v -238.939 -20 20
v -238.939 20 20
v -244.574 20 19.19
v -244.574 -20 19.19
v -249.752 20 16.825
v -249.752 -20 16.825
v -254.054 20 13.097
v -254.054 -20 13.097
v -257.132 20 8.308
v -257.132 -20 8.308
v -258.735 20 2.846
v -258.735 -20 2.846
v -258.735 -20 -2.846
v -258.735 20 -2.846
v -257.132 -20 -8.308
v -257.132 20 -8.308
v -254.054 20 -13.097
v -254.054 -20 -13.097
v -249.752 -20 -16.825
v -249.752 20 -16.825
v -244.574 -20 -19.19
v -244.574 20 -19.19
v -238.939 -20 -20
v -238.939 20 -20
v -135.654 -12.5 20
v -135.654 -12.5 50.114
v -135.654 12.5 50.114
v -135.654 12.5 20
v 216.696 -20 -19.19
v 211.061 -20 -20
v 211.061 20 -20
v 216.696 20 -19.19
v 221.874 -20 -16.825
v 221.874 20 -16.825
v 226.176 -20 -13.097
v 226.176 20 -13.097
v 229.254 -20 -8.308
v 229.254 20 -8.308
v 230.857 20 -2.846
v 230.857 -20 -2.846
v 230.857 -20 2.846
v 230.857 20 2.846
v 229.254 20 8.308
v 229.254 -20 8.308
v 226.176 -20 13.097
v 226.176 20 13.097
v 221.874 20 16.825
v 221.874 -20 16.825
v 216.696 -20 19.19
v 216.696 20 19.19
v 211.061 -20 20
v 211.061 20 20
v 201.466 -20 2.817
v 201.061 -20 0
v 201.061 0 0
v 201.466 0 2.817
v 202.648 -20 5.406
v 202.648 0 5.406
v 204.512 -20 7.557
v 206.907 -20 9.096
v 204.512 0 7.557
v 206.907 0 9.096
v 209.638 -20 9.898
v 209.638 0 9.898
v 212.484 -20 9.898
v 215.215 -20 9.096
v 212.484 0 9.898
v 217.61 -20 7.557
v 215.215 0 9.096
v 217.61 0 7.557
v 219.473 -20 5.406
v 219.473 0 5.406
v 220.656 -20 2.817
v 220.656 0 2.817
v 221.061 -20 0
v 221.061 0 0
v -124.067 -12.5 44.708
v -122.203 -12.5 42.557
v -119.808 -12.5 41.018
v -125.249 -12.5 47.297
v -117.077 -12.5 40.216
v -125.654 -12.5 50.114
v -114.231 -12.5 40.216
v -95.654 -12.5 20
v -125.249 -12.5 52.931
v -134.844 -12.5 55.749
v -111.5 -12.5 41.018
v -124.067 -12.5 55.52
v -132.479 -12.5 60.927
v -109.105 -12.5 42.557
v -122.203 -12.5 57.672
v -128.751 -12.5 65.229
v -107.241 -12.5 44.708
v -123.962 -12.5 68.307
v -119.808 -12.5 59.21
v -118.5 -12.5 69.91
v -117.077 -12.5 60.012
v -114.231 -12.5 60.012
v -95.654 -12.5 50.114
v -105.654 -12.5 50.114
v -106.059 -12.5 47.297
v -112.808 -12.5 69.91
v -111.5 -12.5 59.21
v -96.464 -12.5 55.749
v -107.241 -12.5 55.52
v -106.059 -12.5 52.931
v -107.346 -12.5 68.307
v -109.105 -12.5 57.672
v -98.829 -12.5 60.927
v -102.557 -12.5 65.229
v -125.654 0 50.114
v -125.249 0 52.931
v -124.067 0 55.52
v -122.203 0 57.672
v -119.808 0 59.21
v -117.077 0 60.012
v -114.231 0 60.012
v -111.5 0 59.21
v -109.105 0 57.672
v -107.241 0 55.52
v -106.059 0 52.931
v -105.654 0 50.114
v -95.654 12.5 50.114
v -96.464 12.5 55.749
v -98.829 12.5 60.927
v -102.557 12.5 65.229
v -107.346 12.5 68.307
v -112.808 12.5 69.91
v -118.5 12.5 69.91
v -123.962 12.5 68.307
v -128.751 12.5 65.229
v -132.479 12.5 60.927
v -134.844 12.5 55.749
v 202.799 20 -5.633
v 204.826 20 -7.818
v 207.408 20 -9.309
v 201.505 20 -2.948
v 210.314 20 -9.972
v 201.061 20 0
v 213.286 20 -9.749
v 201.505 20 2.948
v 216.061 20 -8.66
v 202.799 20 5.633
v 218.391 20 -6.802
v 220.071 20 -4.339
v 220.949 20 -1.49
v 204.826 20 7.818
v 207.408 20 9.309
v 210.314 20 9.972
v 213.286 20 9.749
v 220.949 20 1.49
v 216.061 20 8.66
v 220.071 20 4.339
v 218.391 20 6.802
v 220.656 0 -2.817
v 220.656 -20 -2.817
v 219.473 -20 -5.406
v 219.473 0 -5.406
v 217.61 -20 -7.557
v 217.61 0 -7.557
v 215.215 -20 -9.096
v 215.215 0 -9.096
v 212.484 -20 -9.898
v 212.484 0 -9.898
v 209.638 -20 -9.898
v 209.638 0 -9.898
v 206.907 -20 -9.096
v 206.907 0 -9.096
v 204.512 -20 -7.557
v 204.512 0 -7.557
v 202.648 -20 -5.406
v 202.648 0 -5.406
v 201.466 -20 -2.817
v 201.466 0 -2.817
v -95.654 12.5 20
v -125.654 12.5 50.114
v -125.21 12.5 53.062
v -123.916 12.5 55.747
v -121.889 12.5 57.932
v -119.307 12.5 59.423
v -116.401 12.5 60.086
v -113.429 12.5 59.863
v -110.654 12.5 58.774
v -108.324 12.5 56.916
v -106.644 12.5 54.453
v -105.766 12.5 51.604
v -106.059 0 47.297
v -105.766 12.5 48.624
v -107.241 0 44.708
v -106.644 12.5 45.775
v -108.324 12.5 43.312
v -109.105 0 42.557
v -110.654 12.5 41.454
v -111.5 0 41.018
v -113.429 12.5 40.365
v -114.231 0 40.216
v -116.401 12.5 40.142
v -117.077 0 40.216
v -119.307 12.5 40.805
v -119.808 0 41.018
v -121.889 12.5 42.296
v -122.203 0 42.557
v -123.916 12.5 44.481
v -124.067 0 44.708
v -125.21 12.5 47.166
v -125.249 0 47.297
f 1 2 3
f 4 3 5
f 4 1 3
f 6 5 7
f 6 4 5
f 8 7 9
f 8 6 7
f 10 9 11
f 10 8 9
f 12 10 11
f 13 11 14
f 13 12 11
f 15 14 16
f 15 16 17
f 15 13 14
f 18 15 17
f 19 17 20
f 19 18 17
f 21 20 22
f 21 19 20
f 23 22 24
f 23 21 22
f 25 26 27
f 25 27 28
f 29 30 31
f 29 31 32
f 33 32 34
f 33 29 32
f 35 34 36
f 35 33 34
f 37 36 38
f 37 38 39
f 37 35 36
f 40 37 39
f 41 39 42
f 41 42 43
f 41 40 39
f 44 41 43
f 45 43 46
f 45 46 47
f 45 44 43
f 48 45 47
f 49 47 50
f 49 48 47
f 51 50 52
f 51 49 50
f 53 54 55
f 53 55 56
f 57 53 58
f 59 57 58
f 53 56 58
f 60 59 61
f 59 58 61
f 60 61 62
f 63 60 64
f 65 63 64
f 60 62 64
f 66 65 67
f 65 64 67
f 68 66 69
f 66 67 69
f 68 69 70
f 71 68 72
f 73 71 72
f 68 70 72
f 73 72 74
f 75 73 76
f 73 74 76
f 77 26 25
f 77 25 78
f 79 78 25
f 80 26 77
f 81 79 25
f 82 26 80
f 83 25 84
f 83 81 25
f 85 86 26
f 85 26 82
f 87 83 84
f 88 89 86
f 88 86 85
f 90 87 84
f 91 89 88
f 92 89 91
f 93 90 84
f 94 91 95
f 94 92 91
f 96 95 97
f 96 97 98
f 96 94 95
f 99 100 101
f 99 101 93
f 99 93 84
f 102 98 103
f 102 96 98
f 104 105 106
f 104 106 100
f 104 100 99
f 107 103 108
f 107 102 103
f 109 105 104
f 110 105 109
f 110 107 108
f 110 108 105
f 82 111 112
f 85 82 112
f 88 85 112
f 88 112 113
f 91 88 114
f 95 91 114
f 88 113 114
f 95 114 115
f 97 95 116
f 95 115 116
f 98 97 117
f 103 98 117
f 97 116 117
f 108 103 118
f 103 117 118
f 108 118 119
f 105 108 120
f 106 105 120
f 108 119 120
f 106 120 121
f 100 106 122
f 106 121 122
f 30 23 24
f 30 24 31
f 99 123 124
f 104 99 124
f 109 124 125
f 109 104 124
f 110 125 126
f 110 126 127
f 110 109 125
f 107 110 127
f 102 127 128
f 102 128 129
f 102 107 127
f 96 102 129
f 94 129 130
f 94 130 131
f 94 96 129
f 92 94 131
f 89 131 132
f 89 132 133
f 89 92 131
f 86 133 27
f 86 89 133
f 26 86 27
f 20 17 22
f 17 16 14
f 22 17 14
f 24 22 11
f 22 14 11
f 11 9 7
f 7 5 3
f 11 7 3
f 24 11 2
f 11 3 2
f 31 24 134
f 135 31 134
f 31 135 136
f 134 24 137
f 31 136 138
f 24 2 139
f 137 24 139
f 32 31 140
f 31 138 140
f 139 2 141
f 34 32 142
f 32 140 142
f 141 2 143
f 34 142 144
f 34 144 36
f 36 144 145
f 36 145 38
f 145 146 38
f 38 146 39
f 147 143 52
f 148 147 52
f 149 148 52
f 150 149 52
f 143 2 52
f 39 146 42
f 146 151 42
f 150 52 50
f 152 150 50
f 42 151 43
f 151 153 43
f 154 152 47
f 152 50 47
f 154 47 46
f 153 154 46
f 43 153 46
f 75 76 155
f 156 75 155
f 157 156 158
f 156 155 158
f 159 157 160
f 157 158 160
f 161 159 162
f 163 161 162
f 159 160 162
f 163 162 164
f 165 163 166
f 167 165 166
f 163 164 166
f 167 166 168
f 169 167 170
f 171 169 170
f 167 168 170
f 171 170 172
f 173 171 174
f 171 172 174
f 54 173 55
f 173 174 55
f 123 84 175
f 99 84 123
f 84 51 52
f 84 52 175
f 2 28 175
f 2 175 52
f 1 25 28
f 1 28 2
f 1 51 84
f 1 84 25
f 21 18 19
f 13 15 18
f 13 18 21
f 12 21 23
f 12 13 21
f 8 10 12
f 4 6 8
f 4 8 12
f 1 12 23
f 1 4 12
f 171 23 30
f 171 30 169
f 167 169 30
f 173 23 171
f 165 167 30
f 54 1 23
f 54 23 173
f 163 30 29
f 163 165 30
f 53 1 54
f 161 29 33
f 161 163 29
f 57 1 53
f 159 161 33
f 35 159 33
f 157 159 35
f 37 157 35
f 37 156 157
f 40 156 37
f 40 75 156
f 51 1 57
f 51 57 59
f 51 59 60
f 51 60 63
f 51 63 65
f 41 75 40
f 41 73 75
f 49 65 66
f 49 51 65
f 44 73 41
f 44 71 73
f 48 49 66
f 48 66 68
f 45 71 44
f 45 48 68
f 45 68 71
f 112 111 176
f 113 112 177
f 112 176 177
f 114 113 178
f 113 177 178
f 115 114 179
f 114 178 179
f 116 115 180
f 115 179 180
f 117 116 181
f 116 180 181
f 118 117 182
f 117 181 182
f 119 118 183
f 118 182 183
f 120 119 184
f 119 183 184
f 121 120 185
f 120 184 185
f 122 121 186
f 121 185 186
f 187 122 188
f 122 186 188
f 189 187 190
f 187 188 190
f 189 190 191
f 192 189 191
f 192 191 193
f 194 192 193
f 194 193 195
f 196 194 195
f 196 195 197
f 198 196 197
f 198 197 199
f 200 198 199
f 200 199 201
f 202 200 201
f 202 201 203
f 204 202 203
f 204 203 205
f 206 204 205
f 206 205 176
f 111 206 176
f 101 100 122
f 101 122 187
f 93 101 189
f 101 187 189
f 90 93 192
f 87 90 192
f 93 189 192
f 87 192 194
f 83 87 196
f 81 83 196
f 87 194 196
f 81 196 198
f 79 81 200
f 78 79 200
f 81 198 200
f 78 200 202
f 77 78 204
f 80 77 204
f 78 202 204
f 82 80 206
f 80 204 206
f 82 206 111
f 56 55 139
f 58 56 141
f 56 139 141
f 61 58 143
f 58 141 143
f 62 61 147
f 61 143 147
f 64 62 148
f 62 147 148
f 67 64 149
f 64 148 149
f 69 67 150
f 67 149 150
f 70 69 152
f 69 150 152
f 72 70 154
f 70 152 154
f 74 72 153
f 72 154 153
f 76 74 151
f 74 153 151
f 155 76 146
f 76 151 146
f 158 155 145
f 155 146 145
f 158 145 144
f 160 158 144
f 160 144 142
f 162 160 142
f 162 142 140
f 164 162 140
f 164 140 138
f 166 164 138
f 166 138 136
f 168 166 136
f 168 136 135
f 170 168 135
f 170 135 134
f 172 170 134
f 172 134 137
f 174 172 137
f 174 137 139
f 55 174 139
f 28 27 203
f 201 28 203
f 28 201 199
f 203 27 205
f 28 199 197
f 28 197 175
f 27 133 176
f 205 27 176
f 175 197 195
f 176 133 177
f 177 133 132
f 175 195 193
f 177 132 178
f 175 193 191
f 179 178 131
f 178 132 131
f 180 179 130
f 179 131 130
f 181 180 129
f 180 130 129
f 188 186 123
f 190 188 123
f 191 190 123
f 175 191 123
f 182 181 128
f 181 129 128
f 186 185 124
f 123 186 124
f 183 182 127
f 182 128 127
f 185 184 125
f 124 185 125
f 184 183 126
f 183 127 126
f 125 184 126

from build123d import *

# Parameters (mm, degrees)
F0_W     = 20
F0_H     = 20
F1_DEPTH = 20
F2_DEPTH = 12.5
F3_D     = 20
F3_DEPTH = 20.001
F4_D     = 20


with BuildPart() as f1:
    # F0 (on Front) → F1 (new body, symmetric)
    with BuildSketch(Plane.XZ):
        with BuildLine():
            ThreePointArc((-115.6540289521, -20), (-101.5118933284, -14.1421356237), (-95.6540289521, 0))
            Line((-95.6540289521, 0), (-115.6540289521, 0))
            Line((-115.6540289521, 0), (-135.6540289521, 0))
            ThreePointArc((-135.6540289521, 0), (-129.7961645759, -14.1421356237), (-115.6540289521, -20))
        make_face()
        with BuildLine():
            Line((-95.6540289521, 20), (-95.6540289521, 0))
            ThreePointArc((-95.6540289521, 0), (-101.5118933284, -14.1421356237), (-115.6540289521, -20))
            Line((-115.6540289521, -20), (211.0609319716, -20))
            ThreePointArc((211.0609319716, -20), (231.0609319716, 0), (211.0609319716, 20))
            Line((211.0609319716, 20), (-95.6540289521, 20))
        make_face()
        with Locations((-105.6540289521, 10)):
            Rectangle(F0_W, F0_H)
        with Locations((-125.6540289521, 10)):
            Rectangle(F0_W, F0_H)
        with BuildLine():
            Line((-238.9390680284, -20), (-115.6540289521, -20))
            ThreePointArc((-115.6540289521, -20), (-129.7961645759, -14.1421356237), (-135.6540289521, 0))
            Line((-135.6540289521, 0), (-135.6540289521, 20))
            Line((-135.6540289521, 20), (-238.9390680284, 20))
            ThreePointArc((-238.9390680284, 20), (-258.9390680284, 0), (-238.9390680284, -20))
        make_face()
    extrude(amount=F1_DEPTH, both=True)

    # F0 (on Front) → F2 (join, symmetric)
    with BuildSketch(Plane.XZ):
        with BuildLine():
            ThreePointArc((-115.6540289521, -20), (-101.5118933284, -14.1421356237), (-95.6540289521, 0))
            Line((-95.6540289521, 0), (-115.6540289521, 0))
            Line((-115.6540289521, 0), (-135.6540289521, 0))
            ThreePointArc((-135.6540289521, 0), (-129.7961645759, -14.1421356237), (-115.6540289521, -20))
        make_face()
        with BuildLine():
            Line((-95.6540289521, 20), (-95.6540289521, 0))
            ThreePointArc((-95.6540289521, 0), (-101.5118933284, -14.1421356237), (-115.6540289521, -20))
            Line((-115.6540289521, -20), (211.0609319716, -20))
            ThreePointArc((211.0609319716, -20), (231.0609319716, 0), (211.0609319716, 20))
            Line((211.0609319716, 20), (-95.6540289521, 20))
        make_face()
        with Locations((-105.6540289521, 10)):
            Rectangle(F0_W, F0_H)
        with Locations((-125.6540289521, 10)):
            Rectangle(F0_W, F0_H)
        with BuildLine():
            Line((-238.9390680284, -20), (-115.6540289521, -20))
            ThreePointArc((-115.6540289521, -20), (-129.7961645759, -14.1421356237), (-135.6540289521, 0))
            Line((-135.6540289521, 0), (-135.6540289521, 20))
            Line((-135.6540289521, 20), (-238.9390680284, 20))
            ThreePointArc((-238.9390680284, 20), (-258.9390680284, 0), (-238.9390680284, -20))
        make_face()
        with BuildLine():
            Line((-115.6540289521, 20), (-95.6540289521, 20))
            Line((-95.6540289521, 20), (-95.6540289521, 50.1140356064))
            ThreePointArc((-95.6540289521, 50.1140356064), (-115.6540289521, 70.1140356064), (-135.6540289521, 50.1140356064))
            Line((-135.6540289521, 50.1140356064), (-135.6540289521, 20))
            Line((-135.6540289521, 20), (-115.6540289521, 20))
        make_face()
    extrude(amount=F2_DEPTH, both=True)

    # F3 (through all, one way)
    with BuildSketch(Plane(origin=(0, 0, 0), x_dir=(1, 0, 0), z_dir=(0, 1, 0))):
        with Locations((211.0609319716, 0), (-115.6540289521, -50.1140356064)):
            Circle(F3_D / 2)
    extrude(amount=-F3_DEPTH, mode=Mode.SUBTRACT)

    # F4 (through all)
    with Locations(Plane.XZ):
        with Locations((-115.6540289521, 50.1140356064), (211.0609319716, 0)):
            Hole(F4_D / 2)


solid = f1.part
